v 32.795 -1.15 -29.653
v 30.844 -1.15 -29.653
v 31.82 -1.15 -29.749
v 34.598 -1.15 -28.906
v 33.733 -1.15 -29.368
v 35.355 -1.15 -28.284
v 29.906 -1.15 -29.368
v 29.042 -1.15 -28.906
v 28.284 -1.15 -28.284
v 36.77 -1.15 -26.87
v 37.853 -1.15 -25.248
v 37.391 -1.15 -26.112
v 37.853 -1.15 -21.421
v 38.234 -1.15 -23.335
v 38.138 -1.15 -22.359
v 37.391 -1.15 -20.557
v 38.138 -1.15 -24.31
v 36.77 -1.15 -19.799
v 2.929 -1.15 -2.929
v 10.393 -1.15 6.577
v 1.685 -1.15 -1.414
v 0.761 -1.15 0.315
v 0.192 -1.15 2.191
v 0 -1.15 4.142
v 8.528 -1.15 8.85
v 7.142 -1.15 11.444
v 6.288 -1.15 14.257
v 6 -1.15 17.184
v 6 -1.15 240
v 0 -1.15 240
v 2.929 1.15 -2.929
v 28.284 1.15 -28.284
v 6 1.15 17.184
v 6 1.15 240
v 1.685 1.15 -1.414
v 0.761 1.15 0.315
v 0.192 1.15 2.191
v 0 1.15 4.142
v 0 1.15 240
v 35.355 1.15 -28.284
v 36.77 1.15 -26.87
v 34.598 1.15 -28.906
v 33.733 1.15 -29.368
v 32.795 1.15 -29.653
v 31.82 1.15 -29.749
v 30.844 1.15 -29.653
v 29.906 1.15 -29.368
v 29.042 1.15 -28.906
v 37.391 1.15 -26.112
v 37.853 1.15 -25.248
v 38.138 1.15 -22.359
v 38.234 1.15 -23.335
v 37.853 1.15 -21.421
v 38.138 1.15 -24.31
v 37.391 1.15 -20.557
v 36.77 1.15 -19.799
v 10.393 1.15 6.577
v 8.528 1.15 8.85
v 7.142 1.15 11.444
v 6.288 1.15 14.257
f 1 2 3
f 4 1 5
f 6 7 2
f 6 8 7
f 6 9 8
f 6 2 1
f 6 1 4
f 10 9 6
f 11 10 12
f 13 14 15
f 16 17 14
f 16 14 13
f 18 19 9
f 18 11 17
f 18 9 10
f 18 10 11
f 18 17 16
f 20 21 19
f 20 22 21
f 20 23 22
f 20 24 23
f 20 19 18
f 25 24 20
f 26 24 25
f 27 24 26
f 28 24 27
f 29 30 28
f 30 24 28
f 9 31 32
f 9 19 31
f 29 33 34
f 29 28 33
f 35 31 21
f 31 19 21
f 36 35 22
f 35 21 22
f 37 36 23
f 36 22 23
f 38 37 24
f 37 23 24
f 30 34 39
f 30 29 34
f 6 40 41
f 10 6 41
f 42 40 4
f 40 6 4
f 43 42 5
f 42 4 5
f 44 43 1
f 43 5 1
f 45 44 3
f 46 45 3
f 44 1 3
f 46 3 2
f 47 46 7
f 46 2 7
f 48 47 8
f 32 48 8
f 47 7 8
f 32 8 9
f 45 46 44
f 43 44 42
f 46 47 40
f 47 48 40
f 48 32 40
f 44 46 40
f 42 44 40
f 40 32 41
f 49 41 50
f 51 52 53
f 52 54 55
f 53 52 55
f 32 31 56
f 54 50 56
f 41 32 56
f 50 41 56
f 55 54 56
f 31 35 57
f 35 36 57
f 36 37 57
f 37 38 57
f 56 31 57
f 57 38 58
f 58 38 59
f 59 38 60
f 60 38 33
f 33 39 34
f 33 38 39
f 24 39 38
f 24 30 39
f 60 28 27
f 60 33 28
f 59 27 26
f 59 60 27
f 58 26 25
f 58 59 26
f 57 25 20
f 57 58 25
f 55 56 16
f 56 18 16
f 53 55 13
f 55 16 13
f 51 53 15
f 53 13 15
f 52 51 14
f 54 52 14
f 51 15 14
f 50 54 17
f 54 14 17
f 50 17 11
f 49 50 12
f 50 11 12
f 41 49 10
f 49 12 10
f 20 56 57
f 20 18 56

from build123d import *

# Parameters (mm, degrees)
F1_DEPTH = 1.15
F2_R     = 5
F3_R     = 10
F5_R     = 15


with BuildPart() as f1:
    # F0 (on Front) → F1 (new body, symmetric)
    with BuildSketch(Plane.XZ):
        Polygon((0, 240), (0, 0), (31.8198051534, -31.8198051534), (40.3050865276, -23.3345237792), (6, 10.9705627485), (6, 240), align=None)
    extrude(amount=F1_DEPTH, both=True)

    # F2
    f2_edges = [f1.edges().sort_by_distance(p)[0] for p in [
        (31.819805, 0, -31.819805),
        (40.305087, 0, -23.334524),
    ]]
    fillet(f2_edges, radius=F2_R)

    # F3
    f3_edges = [f1.edges().sort_by_distance(p)[0] for p in [
        (0, 0, 0),
    ]]
    fillet(f3_edges, radius=F3_R)

    # F5
    f5_edges = [f1.edges().sort_by_distance(p)[0] for p in [
        (6, 0, 10.970563),
    ]]
    fillet(f5_edges, radius=F5_R)


solid = f1.part
